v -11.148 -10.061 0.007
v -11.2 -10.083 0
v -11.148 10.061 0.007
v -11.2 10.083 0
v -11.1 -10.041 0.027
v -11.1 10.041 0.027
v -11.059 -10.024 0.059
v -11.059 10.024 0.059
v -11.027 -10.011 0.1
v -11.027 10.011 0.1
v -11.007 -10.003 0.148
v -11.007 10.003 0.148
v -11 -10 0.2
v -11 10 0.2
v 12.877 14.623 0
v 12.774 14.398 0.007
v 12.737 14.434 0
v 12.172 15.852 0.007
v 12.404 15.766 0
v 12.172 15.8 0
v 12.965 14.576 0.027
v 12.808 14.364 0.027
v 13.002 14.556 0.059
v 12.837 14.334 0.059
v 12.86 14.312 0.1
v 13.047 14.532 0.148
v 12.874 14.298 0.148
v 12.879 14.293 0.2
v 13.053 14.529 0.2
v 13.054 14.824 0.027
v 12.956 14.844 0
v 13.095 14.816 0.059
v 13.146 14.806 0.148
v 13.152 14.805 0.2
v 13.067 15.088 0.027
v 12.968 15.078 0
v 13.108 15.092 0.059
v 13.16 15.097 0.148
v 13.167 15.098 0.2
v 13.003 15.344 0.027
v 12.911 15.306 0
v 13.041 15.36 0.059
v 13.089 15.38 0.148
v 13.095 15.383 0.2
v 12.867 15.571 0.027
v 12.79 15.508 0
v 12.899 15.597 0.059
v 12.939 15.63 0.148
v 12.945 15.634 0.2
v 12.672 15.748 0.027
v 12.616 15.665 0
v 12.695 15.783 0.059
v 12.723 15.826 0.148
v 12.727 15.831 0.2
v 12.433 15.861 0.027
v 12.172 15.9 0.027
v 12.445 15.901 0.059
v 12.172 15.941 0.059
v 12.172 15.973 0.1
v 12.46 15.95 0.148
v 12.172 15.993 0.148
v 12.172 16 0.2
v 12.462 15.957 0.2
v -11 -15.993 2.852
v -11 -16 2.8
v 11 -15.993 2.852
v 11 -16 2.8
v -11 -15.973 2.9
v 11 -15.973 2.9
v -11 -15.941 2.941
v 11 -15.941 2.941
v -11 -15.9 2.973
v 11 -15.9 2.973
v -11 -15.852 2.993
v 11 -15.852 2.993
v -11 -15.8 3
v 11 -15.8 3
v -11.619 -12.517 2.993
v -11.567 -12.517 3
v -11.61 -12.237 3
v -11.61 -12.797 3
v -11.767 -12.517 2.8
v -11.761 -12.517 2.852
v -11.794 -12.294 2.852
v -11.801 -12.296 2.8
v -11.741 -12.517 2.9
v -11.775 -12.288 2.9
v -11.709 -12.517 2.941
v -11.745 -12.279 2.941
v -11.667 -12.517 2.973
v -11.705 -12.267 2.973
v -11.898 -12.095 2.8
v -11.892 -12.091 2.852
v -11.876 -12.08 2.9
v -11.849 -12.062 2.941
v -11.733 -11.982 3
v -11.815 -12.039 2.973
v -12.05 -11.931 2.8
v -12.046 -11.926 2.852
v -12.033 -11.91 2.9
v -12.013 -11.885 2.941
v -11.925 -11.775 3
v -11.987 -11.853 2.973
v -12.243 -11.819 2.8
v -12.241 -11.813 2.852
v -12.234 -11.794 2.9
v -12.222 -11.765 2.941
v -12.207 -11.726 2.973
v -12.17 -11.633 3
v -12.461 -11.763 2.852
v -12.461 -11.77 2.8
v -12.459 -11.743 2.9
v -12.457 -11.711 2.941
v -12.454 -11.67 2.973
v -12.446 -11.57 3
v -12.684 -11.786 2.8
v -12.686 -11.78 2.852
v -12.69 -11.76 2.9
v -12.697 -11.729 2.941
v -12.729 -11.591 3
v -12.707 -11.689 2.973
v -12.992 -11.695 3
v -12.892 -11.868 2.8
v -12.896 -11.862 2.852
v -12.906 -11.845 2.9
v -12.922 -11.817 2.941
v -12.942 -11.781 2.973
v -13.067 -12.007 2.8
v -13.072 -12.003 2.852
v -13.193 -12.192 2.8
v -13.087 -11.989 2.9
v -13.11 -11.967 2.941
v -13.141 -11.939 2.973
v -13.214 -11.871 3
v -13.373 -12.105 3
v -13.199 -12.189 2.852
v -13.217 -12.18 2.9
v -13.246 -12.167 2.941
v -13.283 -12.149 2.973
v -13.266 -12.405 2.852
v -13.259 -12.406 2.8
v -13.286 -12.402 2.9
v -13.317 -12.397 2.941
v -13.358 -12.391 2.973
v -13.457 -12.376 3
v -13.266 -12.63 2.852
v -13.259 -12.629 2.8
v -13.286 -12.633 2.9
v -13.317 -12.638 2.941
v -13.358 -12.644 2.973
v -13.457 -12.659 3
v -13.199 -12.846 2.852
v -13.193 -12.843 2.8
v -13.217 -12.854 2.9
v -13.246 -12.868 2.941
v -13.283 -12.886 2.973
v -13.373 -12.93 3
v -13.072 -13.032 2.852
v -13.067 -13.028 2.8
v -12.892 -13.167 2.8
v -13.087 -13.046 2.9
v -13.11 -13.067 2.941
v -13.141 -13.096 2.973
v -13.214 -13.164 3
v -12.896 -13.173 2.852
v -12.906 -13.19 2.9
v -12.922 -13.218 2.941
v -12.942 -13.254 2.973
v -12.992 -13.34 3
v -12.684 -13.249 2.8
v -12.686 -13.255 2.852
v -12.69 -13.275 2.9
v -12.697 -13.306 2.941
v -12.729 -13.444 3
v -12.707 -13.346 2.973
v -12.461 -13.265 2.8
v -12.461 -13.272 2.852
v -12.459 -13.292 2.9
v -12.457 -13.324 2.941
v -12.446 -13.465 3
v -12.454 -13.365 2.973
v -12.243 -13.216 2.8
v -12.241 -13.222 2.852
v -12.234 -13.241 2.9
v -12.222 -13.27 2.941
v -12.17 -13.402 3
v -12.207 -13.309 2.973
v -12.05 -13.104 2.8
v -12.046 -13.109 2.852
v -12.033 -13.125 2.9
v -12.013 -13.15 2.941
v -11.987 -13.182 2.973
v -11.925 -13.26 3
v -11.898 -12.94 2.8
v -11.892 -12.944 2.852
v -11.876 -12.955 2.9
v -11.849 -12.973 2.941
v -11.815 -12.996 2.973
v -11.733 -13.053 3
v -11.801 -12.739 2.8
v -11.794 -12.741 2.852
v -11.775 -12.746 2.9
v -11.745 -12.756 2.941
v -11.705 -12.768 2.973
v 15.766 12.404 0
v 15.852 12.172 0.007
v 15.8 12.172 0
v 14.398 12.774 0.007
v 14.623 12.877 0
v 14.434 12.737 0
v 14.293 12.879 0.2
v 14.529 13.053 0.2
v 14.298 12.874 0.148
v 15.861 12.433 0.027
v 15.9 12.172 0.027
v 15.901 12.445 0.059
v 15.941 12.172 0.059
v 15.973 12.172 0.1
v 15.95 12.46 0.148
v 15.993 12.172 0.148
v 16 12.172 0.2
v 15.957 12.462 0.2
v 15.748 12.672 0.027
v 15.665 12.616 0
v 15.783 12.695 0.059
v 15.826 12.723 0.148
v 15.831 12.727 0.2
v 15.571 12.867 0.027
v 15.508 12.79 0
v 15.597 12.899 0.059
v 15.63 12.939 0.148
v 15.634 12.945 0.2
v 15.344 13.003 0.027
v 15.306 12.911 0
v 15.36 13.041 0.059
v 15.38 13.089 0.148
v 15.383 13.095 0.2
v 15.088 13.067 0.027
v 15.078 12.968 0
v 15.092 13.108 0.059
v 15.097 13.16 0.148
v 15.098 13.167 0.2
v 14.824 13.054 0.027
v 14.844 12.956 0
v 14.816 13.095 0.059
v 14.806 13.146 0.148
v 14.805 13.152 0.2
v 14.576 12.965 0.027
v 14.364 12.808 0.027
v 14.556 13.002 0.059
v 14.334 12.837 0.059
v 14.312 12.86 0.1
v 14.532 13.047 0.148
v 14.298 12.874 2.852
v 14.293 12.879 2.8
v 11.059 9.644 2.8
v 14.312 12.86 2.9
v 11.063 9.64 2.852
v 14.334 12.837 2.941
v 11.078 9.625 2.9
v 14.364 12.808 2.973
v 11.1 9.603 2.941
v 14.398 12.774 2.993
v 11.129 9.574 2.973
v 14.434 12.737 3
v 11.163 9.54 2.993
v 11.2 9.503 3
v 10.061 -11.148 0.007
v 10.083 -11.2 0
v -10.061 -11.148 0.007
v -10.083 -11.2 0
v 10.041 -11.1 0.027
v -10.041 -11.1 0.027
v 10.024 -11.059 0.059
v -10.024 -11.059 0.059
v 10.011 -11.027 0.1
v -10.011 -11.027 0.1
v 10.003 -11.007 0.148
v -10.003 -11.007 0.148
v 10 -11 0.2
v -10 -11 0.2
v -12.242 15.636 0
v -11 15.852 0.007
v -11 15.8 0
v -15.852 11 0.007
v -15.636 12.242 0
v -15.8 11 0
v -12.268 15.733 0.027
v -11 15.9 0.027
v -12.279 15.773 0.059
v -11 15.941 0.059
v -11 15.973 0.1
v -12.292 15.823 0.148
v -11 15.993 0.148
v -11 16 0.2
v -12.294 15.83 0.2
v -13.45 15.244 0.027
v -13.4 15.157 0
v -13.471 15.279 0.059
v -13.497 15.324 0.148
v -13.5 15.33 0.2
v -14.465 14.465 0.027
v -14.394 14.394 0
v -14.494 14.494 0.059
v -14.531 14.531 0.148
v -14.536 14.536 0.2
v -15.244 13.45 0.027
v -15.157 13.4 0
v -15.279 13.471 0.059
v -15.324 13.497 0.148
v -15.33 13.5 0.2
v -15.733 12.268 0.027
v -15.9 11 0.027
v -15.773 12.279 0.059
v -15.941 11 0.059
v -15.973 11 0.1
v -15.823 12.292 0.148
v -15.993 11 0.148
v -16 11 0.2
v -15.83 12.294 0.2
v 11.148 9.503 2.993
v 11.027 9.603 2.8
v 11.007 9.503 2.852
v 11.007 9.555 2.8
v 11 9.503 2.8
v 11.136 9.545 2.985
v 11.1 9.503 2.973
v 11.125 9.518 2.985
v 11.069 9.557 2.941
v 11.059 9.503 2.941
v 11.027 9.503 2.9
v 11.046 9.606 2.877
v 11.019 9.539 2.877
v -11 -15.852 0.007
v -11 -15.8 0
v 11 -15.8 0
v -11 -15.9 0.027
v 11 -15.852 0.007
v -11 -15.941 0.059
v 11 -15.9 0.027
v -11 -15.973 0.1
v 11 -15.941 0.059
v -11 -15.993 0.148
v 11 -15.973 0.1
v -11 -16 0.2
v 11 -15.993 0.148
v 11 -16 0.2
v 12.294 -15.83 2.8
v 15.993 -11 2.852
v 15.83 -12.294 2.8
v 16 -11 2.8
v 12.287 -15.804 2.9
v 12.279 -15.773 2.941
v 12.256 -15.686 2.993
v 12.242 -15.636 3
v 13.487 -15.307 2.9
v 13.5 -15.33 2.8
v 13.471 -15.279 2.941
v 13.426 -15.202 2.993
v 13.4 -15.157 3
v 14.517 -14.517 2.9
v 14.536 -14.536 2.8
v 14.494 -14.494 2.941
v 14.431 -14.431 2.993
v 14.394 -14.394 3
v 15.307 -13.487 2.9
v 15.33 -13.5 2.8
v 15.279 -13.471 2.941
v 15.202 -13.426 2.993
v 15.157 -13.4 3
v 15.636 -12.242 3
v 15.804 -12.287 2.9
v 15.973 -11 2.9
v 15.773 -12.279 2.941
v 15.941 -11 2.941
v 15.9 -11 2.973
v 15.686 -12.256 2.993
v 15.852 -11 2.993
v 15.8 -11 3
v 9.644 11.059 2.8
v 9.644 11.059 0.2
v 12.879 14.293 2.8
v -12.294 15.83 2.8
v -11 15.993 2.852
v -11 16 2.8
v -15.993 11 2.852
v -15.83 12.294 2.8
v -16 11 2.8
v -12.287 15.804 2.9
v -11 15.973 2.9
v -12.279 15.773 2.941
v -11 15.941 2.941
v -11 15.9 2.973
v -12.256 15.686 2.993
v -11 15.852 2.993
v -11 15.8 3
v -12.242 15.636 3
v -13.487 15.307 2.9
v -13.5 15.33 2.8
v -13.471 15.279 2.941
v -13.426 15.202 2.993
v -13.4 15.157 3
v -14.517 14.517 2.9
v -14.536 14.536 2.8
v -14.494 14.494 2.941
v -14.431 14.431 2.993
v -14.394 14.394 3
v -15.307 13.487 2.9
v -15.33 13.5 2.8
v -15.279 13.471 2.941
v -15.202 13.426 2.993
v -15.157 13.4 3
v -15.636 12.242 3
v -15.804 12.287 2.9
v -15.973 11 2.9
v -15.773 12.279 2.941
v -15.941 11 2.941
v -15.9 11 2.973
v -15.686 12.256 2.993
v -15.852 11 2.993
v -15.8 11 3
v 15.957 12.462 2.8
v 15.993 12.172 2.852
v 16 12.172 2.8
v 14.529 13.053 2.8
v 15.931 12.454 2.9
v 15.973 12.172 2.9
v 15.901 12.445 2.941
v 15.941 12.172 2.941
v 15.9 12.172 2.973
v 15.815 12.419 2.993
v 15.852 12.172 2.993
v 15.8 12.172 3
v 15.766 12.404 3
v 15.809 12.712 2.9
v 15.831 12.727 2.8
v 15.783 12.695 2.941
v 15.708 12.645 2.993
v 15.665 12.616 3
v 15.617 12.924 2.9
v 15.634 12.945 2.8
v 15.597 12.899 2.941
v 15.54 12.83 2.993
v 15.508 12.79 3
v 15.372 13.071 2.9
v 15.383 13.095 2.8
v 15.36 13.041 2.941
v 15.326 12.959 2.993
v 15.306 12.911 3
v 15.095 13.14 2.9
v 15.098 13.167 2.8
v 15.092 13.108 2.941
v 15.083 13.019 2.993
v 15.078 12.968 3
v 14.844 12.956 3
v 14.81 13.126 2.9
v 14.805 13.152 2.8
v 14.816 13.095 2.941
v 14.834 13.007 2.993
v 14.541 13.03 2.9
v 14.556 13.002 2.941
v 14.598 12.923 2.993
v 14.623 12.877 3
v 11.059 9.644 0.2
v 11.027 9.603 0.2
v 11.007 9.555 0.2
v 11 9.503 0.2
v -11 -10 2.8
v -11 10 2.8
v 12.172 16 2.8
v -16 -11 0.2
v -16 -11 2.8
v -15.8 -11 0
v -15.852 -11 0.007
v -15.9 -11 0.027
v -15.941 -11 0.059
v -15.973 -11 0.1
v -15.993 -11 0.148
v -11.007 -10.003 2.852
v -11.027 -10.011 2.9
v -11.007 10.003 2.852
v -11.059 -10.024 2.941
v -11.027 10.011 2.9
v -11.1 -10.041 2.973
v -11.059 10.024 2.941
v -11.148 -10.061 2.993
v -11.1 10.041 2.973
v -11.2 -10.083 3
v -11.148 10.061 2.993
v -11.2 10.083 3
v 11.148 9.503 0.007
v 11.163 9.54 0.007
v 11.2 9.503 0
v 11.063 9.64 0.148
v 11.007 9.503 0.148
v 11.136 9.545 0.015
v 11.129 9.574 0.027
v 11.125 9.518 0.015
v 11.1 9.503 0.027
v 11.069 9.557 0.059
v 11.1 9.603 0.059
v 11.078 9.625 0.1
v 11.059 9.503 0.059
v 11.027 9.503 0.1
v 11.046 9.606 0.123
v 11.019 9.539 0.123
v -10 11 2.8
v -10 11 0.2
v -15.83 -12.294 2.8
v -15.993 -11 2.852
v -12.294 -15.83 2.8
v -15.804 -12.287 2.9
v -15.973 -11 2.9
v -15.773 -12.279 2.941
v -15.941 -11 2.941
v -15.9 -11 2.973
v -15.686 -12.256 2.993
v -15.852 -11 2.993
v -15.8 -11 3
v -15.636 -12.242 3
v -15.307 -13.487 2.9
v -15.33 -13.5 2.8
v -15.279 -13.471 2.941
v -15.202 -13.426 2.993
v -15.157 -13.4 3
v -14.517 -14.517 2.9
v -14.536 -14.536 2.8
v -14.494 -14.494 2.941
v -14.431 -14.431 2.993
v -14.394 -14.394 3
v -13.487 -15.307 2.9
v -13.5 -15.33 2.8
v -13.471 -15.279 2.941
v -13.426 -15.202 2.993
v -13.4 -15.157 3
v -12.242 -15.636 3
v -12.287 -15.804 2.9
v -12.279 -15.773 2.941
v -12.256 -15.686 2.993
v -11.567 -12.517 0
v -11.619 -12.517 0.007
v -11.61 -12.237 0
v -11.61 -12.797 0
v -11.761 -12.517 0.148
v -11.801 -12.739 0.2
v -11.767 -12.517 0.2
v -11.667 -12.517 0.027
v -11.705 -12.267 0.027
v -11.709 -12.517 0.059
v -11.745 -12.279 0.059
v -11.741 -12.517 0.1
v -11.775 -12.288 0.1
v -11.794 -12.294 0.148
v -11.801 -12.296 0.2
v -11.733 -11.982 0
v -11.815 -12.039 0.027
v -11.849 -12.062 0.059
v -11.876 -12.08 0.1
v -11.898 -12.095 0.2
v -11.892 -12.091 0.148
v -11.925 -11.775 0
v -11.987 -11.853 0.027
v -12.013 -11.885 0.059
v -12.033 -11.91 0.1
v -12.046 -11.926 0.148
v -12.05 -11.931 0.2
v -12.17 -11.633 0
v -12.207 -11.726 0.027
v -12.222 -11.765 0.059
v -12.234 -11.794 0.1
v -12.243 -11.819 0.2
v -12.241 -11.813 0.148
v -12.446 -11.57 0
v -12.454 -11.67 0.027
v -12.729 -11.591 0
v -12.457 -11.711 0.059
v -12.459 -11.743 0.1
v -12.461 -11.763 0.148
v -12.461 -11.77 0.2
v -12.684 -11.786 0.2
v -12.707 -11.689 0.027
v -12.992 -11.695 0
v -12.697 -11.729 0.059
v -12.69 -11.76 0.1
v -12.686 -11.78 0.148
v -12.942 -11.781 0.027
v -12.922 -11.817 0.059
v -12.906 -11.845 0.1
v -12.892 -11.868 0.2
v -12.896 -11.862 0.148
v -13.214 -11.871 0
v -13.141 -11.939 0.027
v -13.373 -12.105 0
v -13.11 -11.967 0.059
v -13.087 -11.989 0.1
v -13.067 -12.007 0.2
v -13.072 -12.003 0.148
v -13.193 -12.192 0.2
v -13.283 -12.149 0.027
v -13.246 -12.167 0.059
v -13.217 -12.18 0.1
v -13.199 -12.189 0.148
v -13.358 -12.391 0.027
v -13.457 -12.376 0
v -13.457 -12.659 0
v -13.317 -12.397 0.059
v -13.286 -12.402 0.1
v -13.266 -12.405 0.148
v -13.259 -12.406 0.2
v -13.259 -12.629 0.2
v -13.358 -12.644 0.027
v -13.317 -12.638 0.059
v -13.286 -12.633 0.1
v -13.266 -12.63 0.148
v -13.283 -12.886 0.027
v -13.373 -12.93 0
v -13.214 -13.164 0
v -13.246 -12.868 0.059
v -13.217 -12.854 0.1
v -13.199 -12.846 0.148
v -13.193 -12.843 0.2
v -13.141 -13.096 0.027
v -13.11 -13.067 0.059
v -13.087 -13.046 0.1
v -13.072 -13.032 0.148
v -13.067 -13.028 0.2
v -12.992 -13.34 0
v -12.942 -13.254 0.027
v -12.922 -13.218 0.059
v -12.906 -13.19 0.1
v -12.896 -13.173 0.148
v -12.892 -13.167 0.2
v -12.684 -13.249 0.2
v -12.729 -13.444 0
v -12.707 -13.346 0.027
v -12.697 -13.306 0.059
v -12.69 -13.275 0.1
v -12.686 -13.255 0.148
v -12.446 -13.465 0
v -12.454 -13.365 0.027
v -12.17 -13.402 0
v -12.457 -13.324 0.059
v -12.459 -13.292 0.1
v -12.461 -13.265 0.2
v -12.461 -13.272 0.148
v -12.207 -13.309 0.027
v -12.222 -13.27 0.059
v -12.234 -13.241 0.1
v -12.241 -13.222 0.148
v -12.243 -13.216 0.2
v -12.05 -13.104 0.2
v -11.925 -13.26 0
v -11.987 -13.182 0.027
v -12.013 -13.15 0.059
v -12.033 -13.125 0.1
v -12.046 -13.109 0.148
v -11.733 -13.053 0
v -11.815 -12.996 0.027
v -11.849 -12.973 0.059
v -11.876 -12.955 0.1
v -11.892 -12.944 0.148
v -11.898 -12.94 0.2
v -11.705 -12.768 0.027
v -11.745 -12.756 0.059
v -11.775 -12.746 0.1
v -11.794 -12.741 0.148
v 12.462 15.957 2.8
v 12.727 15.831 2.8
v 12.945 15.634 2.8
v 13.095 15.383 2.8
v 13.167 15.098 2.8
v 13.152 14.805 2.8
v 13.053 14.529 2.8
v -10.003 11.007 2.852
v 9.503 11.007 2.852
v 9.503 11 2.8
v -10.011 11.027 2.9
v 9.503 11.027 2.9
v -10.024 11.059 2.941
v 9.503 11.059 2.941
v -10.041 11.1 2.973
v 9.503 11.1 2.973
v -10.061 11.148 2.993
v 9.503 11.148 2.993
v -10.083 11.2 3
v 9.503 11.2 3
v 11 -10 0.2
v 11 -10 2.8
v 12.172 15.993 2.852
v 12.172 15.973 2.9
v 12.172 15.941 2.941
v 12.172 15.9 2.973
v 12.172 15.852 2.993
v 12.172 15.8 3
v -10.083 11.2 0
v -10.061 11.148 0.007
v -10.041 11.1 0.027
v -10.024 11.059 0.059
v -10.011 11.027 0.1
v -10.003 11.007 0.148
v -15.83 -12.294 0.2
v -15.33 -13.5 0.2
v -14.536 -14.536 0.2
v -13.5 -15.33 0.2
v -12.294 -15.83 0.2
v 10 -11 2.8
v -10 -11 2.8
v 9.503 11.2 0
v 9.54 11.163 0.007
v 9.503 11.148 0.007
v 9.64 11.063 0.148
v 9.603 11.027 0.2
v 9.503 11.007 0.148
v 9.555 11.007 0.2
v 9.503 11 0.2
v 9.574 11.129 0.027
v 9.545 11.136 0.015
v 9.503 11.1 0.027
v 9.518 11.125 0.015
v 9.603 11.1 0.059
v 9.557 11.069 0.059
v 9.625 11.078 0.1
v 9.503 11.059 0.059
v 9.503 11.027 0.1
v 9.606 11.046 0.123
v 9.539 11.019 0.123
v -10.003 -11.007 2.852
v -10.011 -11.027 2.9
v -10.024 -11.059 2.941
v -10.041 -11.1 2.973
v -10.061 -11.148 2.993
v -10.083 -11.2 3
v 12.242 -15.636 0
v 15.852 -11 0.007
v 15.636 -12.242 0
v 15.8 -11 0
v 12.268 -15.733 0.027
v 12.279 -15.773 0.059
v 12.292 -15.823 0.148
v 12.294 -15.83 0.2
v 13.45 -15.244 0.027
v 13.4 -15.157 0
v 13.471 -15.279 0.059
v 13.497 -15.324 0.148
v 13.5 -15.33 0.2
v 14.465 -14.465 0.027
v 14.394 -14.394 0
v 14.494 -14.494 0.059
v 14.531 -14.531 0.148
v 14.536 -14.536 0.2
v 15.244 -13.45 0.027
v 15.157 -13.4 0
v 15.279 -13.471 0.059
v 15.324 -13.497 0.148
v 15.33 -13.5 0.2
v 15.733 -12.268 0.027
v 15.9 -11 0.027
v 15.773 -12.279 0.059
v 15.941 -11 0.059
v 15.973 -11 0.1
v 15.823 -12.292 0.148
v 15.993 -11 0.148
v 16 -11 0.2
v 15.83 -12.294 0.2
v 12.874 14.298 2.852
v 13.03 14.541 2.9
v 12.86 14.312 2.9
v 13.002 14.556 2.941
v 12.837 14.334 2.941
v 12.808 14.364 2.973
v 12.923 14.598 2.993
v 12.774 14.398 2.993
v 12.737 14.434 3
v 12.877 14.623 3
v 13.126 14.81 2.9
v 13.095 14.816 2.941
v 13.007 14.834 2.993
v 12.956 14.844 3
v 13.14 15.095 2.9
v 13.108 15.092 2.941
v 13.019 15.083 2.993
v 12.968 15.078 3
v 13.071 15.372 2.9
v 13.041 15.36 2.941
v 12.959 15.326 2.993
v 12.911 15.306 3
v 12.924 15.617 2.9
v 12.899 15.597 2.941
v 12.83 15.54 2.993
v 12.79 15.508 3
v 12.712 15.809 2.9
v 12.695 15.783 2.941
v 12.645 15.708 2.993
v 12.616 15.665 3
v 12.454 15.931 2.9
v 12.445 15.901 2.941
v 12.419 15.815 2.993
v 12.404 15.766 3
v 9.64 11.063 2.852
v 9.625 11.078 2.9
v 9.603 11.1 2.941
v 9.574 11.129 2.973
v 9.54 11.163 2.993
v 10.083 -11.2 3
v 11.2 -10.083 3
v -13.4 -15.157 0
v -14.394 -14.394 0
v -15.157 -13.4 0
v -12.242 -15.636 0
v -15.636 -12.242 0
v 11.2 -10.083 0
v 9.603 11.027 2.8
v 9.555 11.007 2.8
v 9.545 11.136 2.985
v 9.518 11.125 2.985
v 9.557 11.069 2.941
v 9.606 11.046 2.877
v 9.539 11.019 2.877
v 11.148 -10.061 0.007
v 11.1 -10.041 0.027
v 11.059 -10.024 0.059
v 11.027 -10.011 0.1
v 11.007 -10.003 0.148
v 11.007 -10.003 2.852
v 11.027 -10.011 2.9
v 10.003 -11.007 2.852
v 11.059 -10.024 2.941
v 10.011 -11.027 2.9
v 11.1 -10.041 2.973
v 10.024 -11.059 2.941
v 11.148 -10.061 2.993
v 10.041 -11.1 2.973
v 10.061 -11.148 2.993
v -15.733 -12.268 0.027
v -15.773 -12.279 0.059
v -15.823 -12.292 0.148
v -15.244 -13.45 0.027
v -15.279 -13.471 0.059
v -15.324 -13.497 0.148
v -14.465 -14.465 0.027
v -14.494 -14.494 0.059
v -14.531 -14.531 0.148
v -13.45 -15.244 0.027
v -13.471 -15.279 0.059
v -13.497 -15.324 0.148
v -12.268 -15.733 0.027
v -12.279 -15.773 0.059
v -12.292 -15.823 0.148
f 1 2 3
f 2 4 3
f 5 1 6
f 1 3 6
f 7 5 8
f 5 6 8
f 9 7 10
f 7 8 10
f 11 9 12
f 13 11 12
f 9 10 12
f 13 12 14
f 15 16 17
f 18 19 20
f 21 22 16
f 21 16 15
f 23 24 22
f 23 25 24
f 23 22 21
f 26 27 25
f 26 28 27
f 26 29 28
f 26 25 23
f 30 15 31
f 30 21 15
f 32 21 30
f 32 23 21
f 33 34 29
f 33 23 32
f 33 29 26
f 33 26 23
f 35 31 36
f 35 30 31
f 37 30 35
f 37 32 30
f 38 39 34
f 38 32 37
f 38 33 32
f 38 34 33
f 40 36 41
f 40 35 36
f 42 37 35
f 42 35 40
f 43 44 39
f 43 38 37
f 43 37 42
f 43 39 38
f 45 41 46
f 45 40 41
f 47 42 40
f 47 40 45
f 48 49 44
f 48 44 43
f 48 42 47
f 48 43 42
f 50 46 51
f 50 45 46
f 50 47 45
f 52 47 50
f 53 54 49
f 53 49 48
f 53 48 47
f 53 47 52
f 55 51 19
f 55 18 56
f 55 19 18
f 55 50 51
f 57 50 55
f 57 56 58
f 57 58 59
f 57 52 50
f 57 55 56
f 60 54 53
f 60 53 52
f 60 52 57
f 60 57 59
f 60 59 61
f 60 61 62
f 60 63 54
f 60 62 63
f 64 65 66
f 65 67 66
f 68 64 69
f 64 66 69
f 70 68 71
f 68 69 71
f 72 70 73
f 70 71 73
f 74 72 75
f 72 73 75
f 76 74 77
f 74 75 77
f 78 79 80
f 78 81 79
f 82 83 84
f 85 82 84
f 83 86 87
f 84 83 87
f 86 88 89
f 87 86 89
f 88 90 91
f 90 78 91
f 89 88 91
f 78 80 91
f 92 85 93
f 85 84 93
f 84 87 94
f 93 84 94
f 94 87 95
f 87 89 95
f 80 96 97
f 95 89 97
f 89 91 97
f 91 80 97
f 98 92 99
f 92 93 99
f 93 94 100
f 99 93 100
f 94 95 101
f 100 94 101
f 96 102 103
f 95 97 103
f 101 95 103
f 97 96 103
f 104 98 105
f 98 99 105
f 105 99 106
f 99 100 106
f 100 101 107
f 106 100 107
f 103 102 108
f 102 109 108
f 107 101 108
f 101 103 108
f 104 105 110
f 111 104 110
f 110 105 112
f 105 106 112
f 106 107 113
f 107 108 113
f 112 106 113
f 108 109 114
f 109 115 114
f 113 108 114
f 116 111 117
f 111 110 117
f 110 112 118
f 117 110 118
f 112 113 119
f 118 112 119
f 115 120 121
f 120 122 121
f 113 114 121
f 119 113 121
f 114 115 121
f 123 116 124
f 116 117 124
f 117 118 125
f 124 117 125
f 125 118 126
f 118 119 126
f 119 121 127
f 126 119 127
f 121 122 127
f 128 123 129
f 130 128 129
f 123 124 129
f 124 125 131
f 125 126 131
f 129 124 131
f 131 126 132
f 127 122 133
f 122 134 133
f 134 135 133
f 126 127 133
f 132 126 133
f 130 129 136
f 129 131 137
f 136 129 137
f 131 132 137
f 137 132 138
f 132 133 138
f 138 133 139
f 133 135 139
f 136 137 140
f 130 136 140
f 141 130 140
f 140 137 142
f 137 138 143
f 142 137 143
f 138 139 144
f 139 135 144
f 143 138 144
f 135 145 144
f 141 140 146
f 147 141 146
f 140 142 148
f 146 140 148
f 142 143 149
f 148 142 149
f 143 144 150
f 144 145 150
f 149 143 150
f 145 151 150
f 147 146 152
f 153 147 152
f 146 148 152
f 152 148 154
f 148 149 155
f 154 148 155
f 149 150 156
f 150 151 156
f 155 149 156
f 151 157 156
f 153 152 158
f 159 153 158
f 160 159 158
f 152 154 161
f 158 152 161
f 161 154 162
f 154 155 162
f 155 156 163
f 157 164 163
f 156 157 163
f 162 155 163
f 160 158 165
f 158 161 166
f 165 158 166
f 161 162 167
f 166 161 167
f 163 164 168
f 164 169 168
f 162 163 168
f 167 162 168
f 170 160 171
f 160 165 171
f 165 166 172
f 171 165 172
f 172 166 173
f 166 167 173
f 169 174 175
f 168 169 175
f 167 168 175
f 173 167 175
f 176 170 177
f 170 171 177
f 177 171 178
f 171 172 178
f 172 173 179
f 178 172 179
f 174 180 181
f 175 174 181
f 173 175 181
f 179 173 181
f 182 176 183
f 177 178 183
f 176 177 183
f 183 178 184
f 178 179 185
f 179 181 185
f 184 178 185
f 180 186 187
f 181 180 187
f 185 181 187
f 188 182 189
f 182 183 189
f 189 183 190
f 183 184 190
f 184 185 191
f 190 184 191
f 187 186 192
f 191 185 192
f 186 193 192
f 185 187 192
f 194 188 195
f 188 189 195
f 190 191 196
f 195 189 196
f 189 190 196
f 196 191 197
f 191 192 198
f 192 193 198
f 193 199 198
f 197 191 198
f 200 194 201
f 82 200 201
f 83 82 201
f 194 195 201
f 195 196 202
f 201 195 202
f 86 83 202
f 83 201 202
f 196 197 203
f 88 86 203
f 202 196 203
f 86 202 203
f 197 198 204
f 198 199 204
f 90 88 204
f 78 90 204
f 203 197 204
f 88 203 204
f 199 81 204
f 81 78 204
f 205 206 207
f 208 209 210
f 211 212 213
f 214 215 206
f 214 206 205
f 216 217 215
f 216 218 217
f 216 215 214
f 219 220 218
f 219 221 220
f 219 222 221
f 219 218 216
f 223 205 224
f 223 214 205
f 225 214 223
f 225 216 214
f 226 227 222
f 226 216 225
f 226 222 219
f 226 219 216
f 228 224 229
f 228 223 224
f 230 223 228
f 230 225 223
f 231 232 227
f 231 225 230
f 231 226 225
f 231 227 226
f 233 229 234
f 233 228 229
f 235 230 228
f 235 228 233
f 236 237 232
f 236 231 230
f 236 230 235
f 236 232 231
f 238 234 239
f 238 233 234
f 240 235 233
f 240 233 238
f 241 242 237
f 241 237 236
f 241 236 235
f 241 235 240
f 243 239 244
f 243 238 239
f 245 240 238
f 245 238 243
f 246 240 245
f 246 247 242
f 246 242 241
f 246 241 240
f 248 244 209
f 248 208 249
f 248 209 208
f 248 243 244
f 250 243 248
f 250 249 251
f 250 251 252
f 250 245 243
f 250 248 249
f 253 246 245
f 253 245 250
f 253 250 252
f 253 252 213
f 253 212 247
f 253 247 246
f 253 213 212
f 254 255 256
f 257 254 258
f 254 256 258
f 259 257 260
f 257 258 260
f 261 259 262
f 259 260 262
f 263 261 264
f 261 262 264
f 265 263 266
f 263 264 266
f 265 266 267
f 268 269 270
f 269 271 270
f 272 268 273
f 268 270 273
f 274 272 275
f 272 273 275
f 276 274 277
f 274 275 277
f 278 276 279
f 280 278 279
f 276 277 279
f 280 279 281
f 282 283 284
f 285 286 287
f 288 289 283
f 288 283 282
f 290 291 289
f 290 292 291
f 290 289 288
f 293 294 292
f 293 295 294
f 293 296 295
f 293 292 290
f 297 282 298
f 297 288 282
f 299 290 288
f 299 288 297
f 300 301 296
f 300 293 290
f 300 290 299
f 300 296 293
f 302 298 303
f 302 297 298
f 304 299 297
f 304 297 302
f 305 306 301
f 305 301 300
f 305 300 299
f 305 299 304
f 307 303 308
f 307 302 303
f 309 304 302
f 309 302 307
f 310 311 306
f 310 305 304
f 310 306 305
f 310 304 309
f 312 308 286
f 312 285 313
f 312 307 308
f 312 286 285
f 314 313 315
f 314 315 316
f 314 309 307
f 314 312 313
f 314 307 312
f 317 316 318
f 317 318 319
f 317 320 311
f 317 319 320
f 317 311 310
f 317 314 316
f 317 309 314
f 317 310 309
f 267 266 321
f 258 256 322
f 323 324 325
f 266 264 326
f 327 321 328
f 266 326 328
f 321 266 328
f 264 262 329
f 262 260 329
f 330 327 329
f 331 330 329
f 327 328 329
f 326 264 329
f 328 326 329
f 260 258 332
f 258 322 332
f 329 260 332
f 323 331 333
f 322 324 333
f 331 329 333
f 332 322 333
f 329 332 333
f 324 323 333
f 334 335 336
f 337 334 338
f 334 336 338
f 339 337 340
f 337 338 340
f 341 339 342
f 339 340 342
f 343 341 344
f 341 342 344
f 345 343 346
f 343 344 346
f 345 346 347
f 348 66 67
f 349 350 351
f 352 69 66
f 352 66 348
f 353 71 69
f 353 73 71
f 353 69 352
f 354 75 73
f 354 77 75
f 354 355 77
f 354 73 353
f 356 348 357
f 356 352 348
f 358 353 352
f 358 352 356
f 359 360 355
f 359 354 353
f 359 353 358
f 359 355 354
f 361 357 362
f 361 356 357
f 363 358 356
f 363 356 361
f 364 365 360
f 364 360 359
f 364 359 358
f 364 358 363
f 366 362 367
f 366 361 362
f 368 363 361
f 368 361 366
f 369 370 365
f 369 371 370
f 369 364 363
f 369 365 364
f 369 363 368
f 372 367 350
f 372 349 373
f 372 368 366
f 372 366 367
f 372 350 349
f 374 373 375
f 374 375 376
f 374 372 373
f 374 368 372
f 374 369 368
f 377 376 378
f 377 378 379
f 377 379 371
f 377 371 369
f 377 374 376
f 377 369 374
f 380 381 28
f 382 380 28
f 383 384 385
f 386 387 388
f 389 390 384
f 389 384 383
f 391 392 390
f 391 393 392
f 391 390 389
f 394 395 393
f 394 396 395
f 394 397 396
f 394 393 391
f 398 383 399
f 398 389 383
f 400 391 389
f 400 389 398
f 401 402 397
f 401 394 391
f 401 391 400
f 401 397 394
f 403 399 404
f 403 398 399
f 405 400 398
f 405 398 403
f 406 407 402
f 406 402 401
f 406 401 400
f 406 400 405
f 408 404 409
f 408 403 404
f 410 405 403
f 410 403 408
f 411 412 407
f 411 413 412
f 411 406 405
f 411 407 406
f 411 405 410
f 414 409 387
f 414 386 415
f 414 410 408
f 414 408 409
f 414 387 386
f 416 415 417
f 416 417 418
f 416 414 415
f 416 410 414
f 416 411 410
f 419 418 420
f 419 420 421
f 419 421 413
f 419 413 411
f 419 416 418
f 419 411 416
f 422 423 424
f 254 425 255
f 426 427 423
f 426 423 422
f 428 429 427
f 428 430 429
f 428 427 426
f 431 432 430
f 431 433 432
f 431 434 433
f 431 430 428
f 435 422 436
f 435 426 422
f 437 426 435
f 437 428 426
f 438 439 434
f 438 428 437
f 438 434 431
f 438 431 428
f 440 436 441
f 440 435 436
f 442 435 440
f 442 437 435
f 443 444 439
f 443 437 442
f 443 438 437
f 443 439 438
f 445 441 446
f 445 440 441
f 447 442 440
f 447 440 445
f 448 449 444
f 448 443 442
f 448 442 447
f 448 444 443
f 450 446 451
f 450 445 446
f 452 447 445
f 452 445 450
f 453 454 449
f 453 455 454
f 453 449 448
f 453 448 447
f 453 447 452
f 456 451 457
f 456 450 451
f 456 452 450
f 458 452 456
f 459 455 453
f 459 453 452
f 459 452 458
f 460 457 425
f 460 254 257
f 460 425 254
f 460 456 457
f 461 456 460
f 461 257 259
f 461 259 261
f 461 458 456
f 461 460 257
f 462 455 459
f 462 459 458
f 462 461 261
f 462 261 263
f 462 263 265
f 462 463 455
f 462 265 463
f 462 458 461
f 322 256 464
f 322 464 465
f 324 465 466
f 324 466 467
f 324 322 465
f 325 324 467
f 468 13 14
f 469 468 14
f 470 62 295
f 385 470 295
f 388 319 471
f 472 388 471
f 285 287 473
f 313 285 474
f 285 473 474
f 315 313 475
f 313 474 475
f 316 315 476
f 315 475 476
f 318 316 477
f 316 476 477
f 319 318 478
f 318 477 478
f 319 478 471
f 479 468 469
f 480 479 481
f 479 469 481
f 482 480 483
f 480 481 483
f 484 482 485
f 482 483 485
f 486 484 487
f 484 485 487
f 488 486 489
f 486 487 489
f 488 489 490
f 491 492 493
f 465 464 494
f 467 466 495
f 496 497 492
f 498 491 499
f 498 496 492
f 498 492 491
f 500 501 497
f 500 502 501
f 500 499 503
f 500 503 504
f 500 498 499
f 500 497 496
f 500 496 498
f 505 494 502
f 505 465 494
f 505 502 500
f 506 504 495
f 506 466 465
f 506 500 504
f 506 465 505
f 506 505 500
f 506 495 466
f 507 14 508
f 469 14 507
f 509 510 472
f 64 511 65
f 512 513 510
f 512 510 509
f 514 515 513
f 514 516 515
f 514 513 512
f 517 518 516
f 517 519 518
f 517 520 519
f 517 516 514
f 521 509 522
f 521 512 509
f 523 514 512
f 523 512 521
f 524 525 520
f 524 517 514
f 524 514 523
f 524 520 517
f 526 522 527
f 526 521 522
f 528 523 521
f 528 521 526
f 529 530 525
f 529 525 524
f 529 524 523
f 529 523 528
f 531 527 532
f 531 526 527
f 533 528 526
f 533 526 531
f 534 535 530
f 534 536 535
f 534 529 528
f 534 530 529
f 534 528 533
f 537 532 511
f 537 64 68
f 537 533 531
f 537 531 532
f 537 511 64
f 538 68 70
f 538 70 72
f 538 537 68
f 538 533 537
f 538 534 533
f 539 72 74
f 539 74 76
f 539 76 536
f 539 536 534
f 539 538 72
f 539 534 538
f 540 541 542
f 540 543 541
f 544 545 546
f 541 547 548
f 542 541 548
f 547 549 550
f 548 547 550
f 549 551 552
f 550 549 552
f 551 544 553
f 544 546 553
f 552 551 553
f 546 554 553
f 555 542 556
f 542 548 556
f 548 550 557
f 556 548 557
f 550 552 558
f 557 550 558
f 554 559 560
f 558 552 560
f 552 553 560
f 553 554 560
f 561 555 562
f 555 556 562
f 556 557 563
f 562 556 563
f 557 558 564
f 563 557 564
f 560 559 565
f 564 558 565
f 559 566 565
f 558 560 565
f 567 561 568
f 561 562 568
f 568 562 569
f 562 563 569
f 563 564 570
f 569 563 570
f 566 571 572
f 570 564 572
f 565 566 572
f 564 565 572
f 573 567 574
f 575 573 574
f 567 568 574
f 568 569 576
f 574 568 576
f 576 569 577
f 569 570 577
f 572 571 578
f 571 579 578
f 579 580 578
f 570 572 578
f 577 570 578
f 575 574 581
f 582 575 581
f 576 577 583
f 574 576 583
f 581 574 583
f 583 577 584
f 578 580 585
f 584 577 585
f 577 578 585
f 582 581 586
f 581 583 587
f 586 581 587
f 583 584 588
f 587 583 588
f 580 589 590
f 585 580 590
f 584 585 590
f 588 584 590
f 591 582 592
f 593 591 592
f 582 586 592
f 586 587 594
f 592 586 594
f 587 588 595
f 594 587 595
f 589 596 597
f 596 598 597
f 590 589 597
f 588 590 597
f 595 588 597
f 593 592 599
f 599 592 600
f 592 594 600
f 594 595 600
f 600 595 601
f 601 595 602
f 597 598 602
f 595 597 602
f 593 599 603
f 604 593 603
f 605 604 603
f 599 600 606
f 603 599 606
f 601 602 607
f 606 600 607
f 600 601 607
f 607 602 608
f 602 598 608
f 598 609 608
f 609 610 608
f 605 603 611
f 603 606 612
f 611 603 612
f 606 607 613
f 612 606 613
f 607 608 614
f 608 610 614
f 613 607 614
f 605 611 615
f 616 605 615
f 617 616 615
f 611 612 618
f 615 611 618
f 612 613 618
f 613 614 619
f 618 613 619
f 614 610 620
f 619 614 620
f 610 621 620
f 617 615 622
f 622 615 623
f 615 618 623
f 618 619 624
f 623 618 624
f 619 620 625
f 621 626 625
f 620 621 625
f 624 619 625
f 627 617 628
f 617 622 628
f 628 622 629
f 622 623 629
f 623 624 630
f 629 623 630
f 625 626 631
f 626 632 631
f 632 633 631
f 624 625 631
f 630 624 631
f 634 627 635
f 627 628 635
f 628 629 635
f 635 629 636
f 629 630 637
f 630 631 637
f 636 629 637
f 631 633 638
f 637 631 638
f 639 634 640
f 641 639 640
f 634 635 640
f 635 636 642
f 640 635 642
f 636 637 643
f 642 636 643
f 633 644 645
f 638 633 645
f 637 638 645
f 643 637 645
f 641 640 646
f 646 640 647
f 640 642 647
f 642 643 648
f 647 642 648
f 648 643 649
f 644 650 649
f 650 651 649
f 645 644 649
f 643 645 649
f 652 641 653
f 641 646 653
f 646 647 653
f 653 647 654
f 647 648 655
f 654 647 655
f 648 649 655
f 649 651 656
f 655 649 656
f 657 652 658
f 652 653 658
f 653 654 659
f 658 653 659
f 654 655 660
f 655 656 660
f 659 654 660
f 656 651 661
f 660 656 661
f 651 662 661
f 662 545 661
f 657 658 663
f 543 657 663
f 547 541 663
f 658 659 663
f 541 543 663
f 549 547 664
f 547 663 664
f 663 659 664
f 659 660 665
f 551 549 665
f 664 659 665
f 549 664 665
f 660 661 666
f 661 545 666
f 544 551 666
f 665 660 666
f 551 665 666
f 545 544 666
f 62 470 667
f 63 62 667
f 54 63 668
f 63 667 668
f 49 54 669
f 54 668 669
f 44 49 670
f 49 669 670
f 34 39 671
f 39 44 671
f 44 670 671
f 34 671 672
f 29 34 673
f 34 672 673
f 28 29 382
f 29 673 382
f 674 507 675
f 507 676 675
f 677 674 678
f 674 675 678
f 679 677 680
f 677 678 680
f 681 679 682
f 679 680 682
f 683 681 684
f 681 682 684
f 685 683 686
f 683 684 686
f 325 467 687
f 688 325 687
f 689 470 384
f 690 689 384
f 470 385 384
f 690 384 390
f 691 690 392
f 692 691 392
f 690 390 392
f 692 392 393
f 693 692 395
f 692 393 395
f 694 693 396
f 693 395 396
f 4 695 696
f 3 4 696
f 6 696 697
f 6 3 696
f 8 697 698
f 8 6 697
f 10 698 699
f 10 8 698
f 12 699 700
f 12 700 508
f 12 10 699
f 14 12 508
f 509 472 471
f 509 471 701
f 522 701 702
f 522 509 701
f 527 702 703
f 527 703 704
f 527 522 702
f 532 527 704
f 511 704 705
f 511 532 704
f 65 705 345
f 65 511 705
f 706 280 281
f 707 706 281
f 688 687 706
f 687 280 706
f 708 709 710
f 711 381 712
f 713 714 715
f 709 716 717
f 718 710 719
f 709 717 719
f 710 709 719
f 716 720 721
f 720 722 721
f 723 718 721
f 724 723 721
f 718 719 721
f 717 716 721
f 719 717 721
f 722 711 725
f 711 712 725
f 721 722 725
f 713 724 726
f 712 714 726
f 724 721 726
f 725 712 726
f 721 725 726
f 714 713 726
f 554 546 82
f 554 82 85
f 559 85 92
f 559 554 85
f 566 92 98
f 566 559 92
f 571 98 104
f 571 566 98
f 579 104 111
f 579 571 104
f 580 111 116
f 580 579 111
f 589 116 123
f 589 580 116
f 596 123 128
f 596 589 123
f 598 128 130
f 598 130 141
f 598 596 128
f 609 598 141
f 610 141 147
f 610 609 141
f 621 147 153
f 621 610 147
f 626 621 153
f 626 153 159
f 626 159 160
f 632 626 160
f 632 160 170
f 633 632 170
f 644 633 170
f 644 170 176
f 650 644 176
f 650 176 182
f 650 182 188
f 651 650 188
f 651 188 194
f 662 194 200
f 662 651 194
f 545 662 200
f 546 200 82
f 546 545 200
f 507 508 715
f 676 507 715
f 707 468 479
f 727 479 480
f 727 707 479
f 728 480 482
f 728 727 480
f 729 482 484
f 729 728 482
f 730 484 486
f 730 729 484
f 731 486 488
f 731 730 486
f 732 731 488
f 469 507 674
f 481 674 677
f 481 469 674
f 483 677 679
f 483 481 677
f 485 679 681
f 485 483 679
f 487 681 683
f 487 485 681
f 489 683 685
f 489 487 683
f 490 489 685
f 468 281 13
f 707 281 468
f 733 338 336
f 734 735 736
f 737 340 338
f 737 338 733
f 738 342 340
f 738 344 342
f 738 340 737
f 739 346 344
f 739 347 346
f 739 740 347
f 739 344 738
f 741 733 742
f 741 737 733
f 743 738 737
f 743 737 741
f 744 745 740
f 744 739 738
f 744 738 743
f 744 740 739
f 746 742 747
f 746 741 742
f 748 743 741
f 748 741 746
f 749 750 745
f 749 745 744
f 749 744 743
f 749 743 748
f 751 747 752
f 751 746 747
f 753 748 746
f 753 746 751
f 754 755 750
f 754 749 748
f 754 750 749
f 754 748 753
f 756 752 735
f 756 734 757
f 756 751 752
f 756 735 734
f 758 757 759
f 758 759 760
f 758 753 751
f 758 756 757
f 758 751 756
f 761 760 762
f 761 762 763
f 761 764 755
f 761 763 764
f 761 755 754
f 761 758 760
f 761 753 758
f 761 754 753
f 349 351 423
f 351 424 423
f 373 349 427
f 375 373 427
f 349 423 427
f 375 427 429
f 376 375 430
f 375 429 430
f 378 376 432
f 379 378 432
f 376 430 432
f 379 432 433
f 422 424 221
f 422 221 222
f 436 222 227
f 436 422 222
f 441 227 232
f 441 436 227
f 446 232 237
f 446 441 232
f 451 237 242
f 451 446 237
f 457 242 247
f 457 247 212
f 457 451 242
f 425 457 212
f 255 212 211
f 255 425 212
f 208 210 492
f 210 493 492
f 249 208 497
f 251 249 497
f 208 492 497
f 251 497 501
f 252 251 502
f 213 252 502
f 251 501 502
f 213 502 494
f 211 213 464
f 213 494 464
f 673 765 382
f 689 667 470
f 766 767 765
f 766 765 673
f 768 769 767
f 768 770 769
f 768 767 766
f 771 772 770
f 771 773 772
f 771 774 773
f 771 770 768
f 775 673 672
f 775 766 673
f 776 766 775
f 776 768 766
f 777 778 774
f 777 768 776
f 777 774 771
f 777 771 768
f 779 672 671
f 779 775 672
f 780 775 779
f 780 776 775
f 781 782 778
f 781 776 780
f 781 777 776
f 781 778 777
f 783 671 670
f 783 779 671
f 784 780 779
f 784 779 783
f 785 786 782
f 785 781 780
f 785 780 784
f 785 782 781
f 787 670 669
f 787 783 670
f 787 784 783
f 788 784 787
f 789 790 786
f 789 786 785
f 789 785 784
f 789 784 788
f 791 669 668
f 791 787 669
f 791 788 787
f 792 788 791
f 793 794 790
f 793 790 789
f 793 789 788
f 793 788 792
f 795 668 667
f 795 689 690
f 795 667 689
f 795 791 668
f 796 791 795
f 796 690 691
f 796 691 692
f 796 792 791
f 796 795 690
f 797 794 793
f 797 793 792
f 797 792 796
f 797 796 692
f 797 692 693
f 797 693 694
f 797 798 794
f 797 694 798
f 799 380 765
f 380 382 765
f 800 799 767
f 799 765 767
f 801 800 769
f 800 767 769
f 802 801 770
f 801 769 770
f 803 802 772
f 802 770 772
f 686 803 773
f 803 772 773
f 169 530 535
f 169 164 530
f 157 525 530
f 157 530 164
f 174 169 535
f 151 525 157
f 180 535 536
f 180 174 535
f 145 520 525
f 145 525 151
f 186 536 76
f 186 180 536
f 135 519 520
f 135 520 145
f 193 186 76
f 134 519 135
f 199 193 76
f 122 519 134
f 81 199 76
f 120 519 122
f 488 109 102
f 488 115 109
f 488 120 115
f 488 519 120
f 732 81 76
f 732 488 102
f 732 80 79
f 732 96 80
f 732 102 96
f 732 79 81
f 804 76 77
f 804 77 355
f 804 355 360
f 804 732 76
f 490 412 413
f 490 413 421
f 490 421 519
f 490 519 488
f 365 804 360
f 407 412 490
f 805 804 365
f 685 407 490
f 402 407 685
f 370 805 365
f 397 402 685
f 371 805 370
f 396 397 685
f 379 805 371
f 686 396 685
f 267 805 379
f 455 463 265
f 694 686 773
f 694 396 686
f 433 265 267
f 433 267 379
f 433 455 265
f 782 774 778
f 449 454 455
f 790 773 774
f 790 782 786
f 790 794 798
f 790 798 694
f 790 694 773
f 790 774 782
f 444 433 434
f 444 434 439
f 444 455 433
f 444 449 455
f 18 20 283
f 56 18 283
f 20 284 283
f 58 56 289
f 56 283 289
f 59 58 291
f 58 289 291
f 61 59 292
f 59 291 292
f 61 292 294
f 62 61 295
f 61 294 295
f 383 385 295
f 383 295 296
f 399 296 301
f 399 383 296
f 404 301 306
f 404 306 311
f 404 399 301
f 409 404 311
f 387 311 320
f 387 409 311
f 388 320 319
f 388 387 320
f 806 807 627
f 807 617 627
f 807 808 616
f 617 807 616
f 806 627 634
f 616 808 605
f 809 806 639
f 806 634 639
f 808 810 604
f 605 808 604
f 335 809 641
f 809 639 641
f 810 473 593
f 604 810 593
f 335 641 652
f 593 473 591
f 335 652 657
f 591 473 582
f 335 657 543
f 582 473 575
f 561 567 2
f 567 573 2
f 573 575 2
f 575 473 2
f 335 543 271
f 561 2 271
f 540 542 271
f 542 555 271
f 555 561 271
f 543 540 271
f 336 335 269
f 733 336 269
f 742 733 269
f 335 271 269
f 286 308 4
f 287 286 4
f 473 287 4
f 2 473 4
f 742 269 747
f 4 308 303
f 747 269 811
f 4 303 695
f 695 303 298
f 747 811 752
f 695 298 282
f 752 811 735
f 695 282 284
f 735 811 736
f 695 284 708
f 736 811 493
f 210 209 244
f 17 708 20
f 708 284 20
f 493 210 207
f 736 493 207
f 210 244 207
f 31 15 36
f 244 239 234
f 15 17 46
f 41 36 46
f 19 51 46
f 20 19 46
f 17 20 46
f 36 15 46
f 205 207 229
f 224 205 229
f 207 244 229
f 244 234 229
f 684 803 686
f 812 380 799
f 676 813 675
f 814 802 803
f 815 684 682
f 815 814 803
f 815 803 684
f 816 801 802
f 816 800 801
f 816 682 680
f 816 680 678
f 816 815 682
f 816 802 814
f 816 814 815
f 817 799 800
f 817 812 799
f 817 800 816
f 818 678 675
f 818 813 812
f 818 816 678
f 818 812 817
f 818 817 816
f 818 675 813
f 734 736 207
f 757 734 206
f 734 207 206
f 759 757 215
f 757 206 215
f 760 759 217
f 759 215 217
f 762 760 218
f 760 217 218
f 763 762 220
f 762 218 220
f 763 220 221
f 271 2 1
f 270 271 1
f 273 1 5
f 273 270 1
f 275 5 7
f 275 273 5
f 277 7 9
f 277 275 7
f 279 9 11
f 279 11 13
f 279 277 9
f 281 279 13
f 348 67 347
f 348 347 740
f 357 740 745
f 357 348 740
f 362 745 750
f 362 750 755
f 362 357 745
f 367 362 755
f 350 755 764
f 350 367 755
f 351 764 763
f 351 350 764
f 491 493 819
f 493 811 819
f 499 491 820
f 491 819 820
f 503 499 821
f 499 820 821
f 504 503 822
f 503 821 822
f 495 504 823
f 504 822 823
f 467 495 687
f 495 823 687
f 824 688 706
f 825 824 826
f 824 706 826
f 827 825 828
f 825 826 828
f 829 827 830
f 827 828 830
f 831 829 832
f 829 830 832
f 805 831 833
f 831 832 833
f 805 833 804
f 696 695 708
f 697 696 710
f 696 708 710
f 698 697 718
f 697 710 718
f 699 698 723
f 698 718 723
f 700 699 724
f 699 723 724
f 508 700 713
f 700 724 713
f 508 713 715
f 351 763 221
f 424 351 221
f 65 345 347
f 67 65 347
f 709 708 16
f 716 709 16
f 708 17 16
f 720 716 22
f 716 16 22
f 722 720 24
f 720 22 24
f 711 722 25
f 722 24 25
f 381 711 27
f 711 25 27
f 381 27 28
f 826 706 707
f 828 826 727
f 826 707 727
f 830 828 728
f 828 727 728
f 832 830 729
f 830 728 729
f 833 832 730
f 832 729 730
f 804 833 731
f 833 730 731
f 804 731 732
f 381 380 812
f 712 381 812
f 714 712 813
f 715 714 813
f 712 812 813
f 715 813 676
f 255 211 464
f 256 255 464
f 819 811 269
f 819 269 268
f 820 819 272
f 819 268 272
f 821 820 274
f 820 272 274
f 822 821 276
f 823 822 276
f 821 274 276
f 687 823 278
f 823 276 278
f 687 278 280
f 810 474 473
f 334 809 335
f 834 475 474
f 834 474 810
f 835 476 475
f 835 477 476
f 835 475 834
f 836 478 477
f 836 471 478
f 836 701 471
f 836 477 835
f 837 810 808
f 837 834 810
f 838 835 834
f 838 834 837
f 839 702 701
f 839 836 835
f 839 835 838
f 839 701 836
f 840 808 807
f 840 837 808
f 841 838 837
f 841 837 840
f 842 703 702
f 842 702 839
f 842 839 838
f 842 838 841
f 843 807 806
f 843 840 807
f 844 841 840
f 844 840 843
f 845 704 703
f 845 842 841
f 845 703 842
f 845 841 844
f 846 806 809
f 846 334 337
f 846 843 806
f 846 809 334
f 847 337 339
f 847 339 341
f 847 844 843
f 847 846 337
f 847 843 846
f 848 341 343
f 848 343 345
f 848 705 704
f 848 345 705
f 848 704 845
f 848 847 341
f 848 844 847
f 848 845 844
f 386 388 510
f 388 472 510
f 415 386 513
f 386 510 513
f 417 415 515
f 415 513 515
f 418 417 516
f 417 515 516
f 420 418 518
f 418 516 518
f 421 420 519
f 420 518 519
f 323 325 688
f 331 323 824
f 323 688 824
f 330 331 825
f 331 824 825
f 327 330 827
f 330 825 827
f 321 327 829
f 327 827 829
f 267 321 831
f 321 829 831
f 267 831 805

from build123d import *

# Parameters (mm, degrees)
F0_R     = 0.75
F1_DEPTH = 3
F2_SIZE2 = 1
F2_SIZE  = 1
F3_R     = 5
F4_R     = 1
F5_R     = 0.2


with BuildPart() as f1:
    # F0 (on Top) → F1 (new body)
    with BuildSketch(Plane.XY):
        Polygon((11.1485209167, 16), (-16, 16), (-16, -16), (16, -16), (16, 11.1485209167), (16, 14.5857864376), (11, 9.5857864376), (11, 6.1485209167), (11, -11), (-11, -11), (-11, 11), (6.1485209167, 11), (9.5857864376, 11), (14.5857864376, 16), align=None)
        with Locations((-12.5174511524, -12.5174511524)):
            Circle(F0_R, mode=Mode.SUBTRACT)
    extrude(amount=F1_DEPTH)

    # F2
    f2_edges = [f1.edges().sort_by_distance(p)[0] for p in [
        (-11, 11, 1.5),
        (11, -11, 1.5),
        (-11, -11, 1.5),
    ]]
    chamfer(f2_edges, length=F2_SIZE, length2=F2_SIZE2)

    # F3
    f3_edges = [f1.edges().sort_by_distance(p)[0] for p in [
        (16, -16, 1.5),
        (-16, 16, 1.5),
        (-16, -16, 1.5),
    ]]
    fillet(f3_edges, radius=F3_R)

    # F4
    f4_edges = [f1.edges().sort_by_distance(p)[0] for p in [
        (16, 14.585786, 1.5),
        (14.585786, 16, 1.5),
    ]]
    fillet(f4_edges, radius=F4_R)

    # F5
    f5_edges = [f1.edges().sort_by_distance(p)[0] for p in [
        (16, 0.585786, 3),
        (16, 0.585786, 0),
        (15.382683, 13.095452, 3),
        (14.535534, -14.535534, 3),
        (12.646447, 11.232233, 3),
        (0, -16, 3),
        (11, -0.207107, 3),
        (-14.535534, -14.535534, 3),
        (10.5, -10.5, 3),
        (-16, 0, 3),
        (0, -11, 3),
        (-14.535534, 14.535534, 3),
        (-10.5, -10.5, 3),
        (0.585786, 16, 3),
        (-11, 0, 3),
        (13.095452, 15.382683, 3),
        (-10.5, 10.5, 3),
        (11.232233, 12.646447, 3),
        (-0.207107, 11, 3),
        (-13.267451, -12.517451, 3),
        (15.382683, 13.095452, 0),
        (14.535534, -14.535534, 0),
        (12.646447, 11.232233, 0),
        (0, -16, 0),
        (11, -0.207107, 0),
        (-14.535534, -14.535534, 0),
        (10.5, -10.5, 0),
        (-16, 0, 0),
        (0, -11, 0),
        (-14.535534, 14.535534, 0),
        (-10.5, -10.5, 0),
        (0.585786, 16, 0),
        (-11, 0, 0),
        (13.095452, 15.382683, 0),
        (-10.5, 10.5, 0),
        (11.232233, 12.646447, 0),
        (-0.207107, 11, 0),
        (-13.267451, -12.517451, 0),
        (11, 9.585786, 1.5),
        (9.585786, 11, 1.5),
    ]]
    fillet(f5_edges, radius=F5_R)


solid = f1.part
